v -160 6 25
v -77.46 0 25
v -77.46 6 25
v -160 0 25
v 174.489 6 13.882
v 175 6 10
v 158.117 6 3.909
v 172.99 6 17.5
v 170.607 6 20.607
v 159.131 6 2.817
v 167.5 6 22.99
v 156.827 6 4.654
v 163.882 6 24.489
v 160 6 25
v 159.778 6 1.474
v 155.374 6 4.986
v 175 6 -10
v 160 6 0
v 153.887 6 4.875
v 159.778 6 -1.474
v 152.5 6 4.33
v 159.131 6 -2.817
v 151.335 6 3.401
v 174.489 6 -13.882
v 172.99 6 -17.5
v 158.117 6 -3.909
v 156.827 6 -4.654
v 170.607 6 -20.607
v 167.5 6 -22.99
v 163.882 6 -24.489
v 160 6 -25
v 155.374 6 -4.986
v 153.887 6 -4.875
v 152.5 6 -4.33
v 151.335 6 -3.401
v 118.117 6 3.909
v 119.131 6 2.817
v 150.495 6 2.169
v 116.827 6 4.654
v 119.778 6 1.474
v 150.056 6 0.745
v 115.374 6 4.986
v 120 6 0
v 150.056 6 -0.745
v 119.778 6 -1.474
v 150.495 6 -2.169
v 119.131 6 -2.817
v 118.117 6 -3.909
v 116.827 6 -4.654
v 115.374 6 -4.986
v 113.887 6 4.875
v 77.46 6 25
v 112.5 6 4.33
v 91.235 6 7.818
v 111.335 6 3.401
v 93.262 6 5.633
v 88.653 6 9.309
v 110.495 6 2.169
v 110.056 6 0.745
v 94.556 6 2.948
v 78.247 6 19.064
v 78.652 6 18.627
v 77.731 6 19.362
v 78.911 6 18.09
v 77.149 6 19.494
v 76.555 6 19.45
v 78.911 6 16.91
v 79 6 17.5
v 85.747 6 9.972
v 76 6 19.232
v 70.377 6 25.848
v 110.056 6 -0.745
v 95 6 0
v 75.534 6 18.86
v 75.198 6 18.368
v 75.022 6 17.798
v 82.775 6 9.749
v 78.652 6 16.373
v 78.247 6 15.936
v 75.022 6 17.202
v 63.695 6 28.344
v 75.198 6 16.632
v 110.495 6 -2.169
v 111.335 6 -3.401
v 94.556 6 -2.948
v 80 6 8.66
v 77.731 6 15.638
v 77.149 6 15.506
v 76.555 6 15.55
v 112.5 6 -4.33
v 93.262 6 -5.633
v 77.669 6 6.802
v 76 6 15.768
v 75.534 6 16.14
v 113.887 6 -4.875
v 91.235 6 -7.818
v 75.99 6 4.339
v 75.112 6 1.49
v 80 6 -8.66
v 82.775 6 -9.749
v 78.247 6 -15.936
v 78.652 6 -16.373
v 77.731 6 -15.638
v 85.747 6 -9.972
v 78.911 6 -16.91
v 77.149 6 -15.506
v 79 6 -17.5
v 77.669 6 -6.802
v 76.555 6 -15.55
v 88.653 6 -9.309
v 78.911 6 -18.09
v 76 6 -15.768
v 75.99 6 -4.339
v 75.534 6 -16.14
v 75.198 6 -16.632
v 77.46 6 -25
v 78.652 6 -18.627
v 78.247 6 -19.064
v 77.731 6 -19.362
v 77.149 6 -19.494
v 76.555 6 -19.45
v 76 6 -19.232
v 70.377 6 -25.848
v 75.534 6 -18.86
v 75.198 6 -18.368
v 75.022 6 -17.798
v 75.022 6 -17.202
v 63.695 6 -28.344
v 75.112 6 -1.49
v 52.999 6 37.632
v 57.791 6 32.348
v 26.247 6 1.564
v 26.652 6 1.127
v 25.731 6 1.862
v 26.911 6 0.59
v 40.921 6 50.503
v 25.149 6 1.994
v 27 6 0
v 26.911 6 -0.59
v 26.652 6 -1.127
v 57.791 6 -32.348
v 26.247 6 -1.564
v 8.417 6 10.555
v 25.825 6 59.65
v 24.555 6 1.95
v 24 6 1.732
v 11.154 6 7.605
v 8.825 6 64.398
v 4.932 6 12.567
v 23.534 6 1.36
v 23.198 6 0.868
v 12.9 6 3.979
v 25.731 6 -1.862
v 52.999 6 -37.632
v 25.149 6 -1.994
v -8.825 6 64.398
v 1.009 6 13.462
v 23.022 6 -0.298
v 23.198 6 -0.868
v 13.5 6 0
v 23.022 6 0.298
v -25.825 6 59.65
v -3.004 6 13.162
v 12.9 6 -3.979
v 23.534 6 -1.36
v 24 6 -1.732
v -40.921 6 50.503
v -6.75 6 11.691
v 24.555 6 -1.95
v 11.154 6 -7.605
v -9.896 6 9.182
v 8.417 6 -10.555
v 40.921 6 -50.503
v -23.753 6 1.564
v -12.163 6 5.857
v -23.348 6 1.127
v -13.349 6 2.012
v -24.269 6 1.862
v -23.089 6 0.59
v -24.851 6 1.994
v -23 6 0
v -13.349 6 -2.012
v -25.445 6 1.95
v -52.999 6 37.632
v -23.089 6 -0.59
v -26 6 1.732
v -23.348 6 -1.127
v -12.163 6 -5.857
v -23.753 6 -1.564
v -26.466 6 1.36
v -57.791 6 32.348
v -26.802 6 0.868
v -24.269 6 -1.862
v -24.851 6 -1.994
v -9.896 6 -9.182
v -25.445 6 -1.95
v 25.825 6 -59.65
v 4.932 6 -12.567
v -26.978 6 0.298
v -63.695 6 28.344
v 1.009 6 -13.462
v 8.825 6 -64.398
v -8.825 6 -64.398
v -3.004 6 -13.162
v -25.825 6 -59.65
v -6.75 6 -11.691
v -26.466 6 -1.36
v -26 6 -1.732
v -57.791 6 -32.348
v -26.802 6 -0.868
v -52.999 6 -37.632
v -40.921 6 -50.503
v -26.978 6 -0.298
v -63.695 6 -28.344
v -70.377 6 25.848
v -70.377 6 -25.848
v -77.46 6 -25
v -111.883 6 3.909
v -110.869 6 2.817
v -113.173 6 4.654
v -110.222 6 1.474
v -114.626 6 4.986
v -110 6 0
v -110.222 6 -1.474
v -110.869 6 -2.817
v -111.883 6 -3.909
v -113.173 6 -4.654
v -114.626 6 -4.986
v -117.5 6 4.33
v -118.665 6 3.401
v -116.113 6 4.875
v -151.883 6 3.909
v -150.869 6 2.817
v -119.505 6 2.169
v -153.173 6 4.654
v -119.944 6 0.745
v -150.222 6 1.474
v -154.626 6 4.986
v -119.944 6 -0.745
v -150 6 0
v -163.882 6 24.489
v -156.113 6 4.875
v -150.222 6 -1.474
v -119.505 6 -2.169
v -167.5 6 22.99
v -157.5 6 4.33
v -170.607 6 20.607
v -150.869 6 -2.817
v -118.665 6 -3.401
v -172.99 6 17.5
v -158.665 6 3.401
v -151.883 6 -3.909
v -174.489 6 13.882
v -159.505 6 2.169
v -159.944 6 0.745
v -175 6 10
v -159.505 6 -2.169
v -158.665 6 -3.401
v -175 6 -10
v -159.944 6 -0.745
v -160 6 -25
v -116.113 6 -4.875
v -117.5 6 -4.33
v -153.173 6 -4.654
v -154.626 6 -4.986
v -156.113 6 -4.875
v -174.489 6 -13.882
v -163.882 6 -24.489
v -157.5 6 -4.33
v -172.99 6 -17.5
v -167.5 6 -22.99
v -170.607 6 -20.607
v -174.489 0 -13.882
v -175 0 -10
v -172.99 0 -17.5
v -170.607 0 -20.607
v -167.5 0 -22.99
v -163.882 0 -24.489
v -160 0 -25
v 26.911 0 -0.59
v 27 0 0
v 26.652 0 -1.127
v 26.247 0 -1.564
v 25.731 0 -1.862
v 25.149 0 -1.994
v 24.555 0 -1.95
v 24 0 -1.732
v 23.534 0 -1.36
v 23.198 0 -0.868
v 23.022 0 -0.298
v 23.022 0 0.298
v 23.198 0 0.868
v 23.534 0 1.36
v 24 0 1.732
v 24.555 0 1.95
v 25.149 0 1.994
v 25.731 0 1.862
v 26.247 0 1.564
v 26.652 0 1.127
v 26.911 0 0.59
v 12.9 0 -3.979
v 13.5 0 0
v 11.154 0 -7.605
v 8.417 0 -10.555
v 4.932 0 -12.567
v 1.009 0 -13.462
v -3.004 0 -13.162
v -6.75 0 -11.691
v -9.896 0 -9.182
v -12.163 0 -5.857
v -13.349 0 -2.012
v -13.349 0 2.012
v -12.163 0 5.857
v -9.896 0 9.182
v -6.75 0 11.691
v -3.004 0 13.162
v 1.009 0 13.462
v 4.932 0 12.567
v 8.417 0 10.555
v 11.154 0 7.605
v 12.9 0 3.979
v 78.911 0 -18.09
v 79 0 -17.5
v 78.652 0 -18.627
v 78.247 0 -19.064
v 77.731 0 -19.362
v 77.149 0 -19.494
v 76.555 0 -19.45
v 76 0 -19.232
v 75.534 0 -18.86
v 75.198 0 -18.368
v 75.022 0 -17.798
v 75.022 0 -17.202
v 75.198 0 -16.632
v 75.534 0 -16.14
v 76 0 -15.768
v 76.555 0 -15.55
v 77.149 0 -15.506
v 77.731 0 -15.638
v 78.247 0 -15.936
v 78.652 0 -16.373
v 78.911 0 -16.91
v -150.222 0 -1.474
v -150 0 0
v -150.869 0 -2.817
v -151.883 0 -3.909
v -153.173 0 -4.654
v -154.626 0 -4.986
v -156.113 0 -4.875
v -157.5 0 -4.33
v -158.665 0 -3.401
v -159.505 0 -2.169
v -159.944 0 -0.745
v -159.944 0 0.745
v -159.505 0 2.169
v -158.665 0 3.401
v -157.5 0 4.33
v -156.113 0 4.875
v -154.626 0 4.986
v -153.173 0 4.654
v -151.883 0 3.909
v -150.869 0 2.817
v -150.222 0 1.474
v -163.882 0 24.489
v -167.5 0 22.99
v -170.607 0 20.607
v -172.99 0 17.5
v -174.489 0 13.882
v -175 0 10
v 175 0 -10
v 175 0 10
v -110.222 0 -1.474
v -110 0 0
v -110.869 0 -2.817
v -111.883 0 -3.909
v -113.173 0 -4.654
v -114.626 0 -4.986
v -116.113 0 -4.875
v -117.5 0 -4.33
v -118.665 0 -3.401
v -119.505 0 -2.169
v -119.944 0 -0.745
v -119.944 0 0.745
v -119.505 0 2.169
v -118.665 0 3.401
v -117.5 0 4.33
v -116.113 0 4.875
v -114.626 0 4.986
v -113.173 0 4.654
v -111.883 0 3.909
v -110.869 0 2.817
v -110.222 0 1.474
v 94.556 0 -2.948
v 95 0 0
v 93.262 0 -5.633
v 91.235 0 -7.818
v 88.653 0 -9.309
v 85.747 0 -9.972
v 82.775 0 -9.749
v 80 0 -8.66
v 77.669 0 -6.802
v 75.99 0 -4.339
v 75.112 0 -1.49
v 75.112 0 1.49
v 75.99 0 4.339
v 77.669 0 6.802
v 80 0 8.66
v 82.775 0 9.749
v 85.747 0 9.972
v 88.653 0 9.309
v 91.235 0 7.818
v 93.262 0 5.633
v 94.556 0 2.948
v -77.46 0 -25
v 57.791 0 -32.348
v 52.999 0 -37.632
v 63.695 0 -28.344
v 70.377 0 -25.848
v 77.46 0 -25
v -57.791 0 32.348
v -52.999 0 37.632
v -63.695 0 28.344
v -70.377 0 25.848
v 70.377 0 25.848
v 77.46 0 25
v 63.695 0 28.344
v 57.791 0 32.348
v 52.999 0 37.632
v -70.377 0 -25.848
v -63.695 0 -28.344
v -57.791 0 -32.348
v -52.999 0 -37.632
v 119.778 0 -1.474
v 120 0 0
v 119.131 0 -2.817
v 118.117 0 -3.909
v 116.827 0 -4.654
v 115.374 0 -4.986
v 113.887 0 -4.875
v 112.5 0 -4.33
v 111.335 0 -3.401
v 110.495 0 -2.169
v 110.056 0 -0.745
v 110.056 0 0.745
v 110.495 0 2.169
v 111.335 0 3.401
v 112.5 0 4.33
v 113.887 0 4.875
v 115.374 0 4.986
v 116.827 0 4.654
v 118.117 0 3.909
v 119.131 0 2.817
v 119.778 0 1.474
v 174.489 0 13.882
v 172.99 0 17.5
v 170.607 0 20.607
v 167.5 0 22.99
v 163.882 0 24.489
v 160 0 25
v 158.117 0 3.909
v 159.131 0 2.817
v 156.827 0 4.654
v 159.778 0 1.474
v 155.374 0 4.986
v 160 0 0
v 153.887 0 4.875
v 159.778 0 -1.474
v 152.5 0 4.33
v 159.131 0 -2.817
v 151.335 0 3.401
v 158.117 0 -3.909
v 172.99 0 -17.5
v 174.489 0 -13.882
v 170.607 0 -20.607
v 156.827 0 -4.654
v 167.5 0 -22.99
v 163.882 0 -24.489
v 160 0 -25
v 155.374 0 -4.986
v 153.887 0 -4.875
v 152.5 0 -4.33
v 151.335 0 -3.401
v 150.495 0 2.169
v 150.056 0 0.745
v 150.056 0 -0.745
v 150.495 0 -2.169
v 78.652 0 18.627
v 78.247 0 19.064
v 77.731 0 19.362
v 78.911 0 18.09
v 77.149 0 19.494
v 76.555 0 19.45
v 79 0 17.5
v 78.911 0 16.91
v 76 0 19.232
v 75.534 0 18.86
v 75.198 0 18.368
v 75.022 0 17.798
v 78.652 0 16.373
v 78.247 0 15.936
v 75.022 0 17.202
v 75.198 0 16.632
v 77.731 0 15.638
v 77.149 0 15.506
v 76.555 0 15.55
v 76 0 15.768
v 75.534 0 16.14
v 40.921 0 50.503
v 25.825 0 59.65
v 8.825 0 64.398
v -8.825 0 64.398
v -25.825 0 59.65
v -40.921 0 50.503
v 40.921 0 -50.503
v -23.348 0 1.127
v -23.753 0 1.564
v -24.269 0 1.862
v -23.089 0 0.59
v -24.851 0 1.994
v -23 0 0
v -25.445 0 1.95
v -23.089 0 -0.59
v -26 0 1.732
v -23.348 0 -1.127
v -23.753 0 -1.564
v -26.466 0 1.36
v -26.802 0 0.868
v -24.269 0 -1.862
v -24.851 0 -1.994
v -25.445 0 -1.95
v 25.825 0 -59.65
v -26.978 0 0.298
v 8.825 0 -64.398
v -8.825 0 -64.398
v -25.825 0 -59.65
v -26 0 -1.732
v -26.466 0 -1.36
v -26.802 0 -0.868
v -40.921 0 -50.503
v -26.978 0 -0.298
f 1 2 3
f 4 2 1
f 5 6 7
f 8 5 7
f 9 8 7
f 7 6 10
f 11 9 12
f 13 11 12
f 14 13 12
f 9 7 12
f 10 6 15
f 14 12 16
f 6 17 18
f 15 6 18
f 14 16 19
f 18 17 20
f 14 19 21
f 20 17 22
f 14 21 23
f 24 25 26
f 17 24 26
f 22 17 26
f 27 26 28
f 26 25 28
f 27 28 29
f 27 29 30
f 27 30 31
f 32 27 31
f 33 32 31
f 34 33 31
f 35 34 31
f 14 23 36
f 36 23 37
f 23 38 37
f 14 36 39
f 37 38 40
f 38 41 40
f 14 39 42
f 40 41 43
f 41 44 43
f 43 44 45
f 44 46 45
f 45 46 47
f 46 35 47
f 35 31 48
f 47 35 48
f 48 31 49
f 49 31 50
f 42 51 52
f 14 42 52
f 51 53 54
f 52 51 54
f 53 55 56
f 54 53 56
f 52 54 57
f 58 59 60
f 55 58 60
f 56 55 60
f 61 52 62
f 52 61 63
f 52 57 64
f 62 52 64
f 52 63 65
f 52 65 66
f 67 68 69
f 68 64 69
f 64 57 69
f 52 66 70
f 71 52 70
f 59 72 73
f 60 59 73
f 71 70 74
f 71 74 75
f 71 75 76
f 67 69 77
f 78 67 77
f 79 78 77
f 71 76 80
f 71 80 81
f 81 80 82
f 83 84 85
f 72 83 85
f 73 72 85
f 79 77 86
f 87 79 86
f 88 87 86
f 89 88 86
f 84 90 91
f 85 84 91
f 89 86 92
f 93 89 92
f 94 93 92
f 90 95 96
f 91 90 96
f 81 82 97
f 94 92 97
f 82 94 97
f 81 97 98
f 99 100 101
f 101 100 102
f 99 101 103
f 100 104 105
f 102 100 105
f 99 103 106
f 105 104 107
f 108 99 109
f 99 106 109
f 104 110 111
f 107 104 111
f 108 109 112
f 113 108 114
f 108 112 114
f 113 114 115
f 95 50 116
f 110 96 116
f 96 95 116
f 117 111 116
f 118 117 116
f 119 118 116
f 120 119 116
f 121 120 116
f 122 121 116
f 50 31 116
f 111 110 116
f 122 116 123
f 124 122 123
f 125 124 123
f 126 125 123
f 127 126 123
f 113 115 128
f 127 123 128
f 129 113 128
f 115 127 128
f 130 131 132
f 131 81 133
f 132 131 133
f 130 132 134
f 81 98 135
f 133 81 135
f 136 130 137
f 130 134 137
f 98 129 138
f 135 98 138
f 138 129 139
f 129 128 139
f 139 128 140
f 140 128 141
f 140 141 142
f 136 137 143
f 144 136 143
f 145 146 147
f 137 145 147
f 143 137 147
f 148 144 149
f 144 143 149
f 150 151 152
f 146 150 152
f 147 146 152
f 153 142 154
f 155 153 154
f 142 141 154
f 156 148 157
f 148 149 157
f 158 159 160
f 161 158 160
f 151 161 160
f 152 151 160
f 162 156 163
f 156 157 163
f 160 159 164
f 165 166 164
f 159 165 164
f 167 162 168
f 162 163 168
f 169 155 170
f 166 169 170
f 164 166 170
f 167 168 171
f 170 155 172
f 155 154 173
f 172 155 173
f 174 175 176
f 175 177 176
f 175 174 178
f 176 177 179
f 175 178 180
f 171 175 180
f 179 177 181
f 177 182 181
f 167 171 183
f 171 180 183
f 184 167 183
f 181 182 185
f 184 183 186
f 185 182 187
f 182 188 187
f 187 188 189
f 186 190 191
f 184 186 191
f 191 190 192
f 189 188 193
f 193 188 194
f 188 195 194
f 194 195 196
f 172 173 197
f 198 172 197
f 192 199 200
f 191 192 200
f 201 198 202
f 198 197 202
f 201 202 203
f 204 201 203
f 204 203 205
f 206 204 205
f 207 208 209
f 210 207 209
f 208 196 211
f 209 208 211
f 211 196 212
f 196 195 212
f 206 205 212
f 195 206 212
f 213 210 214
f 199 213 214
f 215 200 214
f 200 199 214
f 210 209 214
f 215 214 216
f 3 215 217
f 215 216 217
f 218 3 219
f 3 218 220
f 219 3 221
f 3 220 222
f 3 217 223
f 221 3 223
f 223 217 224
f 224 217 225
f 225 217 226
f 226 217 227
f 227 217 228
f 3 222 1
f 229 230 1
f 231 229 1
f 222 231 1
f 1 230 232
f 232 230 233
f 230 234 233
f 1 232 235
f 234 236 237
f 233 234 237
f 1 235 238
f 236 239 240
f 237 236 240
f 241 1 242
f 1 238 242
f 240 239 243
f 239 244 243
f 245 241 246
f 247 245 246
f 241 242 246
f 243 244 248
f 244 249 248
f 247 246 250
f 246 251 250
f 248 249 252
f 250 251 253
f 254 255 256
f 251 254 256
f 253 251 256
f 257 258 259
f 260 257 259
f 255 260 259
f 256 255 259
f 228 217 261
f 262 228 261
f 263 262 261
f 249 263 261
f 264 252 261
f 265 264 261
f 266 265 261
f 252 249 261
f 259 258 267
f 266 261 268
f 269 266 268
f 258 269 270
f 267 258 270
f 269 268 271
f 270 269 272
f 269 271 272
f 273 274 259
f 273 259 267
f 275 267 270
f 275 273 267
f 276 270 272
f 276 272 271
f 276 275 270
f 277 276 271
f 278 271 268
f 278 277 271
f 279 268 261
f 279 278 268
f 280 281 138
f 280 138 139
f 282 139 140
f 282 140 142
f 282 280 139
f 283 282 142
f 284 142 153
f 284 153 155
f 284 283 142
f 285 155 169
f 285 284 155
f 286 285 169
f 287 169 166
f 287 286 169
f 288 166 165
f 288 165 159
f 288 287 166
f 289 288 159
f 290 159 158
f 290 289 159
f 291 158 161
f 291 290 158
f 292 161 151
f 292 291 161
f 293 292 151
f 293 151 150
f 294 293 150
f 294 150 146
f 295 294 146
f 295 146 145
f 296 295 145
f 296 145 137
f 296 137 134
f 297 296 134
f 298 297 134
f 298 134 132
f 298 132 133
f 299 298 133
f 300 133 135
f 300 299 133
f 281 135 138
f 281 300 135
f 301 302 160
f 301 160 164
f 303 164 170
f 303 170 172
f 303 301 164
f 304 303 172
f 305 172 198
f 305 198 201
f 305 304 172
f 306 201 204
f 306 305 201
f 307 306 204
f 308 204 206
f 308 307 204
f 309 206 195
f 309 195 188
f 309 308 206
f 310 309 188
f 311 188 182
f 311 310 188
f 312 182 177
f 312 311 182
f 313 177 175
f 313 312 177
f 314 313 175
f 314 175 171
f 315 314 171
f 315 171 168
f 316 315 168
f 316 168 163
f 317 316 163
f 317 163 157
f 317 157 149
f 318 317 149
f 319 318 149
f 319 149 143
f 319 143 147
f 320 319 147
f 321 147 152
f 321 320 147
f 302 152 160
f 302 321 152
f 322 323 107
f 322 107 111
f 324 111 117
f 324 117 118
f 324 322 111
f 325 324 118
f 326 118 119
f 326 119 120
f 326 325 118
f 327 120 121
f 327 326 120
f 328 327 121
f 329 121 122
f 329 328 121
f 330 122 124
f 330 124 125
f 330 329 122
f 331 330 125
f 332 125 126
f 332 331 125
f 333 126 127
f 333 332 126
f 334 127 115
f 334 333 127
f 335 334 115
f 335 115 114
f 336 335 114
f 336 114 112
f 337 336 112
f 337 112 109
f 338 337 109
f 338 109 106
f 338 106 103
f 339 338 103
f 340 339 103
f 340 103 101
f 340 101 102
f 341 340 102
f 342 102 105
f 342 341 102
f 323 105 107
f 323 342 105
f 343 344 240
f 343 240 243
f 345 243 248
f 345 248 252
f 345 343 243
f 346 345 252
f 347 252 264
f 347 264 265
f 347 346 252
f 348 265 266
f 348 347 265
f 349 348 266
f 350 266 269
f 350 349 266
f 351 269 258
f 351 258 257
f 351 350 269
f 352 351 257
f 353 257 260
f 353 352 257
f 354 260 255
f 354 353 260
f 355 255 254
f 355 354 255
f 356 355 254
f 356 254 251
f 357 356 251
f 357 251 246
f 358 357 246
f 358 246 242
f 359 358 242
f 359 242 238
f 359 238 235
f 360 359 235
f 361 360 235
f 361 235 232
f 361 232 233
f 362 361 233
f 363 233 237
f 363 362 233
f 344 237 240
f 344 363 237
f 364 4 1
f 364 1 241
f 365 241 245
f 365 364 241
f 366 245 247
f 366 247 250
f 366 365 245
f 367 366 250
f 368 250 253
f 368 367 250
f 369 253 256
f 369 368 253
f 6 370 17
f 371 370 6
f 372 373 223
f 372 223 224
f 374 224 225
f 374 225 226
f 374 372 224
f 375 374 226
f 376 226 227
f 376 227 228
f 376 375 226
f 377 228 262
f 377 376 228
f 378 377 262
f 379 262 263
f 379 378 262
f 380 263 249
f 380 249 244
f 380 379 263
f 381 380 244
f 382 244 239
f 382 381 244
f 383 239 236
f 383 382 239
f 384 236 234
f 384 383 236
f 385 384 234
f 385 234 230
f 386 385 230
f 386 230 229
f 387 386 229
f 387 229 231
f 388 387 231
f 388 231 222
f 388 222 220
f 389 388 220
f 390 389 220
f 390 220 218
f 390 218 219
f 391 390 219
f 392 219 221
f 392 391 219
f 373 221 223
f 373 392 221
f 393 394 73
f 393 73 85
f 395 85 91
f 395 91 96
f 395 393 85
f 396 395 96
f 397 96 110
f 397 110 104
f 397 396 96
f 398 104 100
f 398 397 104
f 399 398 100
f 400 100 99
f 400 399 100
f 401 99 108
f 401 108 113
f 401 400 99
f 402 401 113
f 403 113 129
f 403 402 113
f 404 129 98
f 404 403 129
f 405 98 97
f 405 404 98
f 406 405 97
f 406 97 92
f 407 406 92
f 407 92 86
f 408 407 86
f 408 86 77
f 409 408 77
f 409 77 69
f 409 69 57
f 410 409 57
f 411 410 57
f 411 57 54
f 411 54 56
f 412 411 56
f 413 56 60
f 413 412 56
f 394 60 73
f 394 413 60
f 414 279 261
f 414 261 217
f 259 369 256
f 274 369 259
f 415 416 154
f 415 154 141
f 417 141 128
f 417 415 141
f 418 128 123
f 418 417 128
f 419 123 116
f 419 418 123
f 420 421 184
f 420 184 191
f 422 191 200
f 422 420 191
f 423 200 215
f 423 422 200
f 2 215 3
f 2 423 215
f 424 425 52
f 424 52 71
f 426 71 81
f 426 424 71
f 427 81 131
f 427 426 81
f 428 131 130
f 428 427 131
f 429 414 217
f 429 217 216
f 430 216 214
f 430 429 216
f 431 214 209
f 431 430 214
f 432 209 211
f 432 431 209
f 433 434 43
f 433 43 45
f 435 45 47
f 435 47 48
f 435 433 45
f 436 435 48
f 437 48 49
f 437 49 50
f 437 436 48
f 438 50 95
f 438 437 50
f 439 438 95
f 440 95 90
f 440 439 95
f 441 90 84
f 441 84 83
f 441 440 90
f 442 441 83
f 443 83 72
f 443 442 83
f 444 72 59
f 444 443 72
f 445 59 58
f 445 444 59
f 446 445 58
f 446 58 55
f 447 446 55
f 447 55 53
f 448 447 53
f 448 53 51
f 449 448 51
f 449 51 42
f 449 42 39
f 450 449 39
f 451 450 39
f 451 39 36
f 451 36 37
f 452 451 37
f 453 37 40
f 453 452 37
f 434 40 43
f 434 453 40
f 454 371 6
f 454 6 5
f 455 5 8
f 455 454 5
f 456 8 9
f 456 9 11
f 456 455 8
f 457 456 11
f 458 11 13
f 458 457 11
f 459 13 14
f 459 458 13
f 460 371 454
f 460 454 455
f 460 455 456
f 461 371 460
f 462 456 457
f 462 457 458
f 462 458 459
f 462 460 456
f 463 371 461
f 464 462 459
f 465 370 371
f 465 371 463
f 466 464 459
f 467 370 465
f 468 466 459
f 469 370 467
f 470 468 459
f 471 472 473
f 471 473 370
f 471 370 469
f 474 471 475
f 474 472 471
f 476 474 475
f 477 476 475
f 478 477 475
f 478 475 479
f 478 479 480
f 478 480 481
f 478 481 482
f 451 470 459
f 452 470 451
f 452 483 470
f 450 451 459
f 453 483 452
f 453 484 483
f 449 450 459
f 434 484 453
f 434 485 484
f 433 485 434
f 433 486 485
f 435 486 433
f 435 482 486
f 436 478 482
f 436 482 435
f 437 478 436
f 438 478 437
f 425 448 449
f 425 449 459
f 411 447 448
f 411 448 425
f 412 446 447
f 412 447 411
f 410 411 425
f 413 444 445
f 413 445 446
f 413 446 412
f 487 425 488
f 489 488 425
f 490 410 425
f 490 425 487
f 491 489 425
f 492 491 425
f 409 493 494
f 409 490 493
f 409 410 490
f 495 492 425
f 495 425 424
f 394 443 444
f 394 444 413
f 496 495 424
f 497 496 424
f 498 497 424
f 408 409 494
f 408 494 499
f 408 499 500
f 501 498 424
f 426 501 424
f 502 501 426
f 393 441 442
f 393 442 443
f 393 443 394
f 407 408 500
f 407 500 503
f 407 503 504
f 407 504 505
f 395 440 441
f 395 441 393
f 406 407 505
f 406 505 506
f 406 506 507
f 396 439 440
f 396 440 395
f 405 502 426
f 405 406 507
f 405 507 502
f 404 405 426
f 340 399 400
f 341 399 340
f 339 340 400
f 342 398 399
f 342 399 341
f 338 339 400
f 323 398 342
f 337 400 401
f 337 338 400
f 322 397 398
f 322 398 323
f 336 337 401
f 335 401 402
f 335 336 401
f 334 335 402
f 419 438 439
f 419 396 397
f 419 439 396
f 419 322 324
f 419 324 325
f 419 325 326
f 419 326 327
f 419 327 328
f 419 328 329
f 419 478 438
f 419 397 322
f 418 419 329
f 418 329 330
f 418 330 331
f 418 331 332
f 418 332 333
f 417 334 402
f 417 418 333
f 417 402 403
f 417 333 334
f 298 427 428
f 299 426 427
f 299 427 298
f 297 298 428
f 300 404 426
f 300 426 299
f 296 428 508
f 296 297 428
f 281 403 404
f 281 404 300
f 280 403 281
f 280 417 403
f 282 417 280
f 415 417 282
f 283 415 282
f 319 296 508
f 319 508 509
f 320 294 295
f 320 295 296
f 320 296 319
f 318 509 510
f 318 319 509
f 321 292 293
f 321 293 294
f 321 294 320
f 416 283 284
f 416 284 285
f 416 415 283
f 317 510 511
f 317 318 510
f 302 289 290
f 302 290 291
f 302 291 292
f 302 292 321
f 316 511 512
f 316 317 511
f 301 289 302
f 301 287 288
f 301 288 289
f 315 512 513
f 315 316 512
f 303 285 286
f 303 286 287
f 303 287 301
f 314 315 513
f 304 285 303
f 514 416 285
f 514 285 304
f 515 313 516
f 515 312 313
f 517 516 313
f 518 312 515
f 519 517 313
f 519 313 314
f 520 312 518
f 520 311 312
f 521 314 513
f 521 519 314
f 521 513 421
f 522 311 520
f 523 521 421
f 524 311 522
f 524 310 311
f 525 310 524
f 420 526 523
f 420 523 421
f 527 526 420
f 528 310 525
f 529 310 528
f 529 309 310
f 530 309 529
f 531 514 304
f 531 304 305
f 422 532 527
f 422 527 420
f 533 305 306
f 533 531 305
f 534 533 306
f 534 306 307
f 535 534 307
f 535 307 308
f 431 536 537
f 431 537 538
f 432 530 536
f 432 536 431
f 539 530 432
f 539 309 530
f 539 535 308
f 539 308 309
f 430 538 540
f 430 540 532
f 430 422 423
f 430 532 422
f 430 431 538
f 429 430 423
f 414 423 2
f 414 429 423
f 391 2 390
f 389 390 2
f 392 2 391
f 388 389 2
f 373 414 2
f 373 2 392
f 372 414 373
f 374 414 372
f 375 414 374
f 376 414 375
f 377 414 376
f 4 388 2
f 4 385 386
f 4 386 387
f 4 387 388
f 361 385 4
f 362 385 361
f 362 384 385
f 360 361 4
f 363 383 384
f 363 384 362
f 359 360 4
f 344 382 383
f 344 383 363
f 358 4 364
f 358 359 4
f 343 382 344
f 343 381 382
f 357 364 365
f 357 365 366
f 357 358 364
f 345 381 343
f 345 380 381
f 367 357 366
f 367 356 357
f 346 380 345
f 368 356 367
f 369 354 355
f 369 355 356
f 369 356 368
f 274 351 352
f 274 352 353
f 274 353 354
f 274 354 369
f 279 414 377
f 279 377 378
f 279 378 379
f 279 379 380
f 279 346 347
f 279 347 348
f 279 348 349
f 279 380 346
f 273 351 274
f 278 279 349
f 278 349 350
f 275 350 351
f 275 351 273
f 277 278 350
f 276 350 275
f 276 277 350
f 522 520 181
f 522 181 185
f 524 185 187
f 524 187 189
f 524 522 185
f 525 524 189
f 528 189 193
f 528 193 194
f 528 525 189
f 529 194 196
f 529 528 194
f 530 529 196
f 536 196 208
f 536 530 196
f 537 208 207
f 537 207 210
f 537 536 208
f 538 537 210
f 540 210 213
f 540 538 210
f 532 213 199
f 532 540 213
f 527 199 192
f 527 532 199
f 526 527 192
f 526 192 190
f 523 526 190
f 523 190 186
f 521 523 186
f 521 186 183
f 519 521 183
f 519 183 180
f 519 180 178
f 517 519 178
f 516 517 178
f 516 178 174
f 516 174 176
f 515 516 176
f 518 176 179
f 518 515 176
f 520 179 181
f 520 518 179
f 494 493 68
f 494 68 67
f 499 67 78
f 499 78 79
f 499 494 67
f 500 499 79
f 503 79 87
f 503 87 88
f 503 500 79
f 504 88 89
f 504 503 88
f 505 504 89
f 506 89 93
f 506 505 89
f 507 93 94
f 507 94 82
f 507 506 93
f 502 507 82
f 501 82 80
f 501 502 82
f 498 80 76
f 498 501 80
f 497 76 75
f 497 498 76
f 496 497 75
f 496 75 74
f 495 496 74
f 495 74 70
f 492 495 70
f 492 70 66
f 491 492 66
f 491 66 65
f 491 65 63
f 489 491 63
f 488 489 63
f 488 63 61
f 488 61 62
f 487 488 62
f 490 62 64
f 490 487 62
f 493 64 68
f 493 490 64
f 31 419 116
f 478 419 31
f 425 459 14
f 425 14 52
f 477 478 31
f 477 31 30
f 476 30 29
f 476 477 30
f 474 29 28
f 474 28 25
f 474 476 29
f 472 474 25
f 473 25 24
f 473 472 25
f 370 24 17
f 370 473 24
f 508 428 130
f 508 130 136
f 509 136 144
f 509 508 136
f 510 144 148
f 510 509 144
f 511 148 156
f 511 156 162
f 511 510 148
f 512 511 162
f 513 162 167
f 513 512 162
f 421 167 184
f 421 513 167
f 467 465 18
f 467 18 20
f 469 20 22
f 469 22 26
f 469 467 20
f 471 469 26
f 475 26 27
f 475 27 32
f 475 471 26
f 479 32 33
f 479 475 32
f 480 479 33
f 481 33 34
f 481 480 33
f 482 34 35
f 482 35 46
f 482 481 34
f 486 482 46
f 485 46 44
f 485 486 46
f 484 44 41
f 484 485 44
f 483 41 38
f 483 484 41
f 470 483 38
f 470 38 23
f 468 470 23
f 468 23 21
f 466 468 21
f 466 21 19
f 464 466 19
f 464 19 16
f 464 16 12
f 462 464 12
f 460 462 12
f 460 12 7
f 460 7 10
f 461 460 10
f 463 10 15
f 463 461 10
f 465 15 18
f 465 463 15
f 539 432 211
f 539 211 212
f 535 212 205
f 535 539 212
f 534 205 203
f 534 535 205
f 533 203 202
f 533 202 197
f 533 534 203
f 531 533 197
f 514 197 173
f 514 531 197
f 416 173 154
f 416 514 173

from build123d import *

# Parameters (mm, degrees)
ESQUISSE1_R        = 13.5
ESQUISSE1_R_2      = 5
ESQUISSE1_R_3      = 10
ESQUISSE1_R_4      = 2
BOSS_EXTRU_1_DEPTH = 6


with BuildPart() as part:
    # Esquisse1 → Boss.-Extru.1 (new body)
    with BuildSketch(Plane(origin=(0, 0, 0), x_dir=(1, 0, 0), z_dir=(0, 1, 0))):
        with BuildLine():
            Line((-160, 25), (-77.459666924, 25))
            ThreePointArc((-77.459666924, 25), (-63.694722892, 28.344300501), (-52.998719474, 37.631578947))
            ThreePointArc((-52.998719474, 37.631578947), (0, 65), (52.998719474, 37.631578947))
            ThreePointArc((52.998719474, 37.631578947), (63.694722892, 28.344300501), (77.459666924, 25))
            Line((77.459666924, 25), (160, 25))
            ThreePointArc((160, 25), (170.606601718, 20.606601718), (175, 10))
            Line((175, 10), (175, -10))
            ThreePointArc((175, -10), (170.606601718, -20.606601718), (160, -25))
            Line((160, -25), (77.459666924, -25))
            ThreePointArc((77.459666924, -25), (63.694722892, -28.344300501), (52.998719474, -37.631578947))
            ThreePointArc((52.998719474, -37.631578947), (0, -65), (-52.998719474, -37.631578947))
            ThreePointArc((-52.998719474, -37.631578947), (-63.694722892, -28.344300501), (-77.459666924, -25))
            Line((-77.459666924, -25), (-160, -25))
            ThreePointArc((-160, -25), (-170.606601718, -20.606601718), (-175, -10))
            Line((-175, -10), (-175, 10))
            ThreePointArc((-175, 10), (-170.606601718, 20.606601718), (-160, 25))
        make_face()
        Circle(ESQUISSE1_R, mode=Mode.SUBTRACT)
        with Locations((-115, 0)):
            Circle(ESQUISSE1_R_2, mode=Mode.SUBTRACT)
        with Locations((-155, 0)):
            Circle(ESQUISSE1_R_2, mode=Mode.SUBTRACT)
        with Locations((155, 0)):
            Circle(ESQUISSE1_R_2, mode=Mode.SUBTRACT)
        with Locations((115, 0)):
            Circle(ESQUISSE1_R_2, mode=Mode.SUBTRACT)
        with Locations((85, 0)):
            Circle(ESQUISSE1_R_3, mode=Mode.SUBTRACT)
        with Locations((-25, 0)):
            Circle(ESQUISSE1_R_4, mode=Mode.SUBTRACT)
        with Locations((25, 0)):
            Circle(ESQUISSE1_R_4, mode=Mode.SUBTRACT)
        with Locations((77, 17.5)):
            Circle(ESQUISSE1_R_4, mode=Mode.SUBTRACT)
        with Locations((77, -17.5)):
            Circle(ESQUISSE1_R_4, mode=Mode.SUBTRACT)
    extrude(amount=BOSS_EXTRU_1_DEPTH)


solid = part.part
